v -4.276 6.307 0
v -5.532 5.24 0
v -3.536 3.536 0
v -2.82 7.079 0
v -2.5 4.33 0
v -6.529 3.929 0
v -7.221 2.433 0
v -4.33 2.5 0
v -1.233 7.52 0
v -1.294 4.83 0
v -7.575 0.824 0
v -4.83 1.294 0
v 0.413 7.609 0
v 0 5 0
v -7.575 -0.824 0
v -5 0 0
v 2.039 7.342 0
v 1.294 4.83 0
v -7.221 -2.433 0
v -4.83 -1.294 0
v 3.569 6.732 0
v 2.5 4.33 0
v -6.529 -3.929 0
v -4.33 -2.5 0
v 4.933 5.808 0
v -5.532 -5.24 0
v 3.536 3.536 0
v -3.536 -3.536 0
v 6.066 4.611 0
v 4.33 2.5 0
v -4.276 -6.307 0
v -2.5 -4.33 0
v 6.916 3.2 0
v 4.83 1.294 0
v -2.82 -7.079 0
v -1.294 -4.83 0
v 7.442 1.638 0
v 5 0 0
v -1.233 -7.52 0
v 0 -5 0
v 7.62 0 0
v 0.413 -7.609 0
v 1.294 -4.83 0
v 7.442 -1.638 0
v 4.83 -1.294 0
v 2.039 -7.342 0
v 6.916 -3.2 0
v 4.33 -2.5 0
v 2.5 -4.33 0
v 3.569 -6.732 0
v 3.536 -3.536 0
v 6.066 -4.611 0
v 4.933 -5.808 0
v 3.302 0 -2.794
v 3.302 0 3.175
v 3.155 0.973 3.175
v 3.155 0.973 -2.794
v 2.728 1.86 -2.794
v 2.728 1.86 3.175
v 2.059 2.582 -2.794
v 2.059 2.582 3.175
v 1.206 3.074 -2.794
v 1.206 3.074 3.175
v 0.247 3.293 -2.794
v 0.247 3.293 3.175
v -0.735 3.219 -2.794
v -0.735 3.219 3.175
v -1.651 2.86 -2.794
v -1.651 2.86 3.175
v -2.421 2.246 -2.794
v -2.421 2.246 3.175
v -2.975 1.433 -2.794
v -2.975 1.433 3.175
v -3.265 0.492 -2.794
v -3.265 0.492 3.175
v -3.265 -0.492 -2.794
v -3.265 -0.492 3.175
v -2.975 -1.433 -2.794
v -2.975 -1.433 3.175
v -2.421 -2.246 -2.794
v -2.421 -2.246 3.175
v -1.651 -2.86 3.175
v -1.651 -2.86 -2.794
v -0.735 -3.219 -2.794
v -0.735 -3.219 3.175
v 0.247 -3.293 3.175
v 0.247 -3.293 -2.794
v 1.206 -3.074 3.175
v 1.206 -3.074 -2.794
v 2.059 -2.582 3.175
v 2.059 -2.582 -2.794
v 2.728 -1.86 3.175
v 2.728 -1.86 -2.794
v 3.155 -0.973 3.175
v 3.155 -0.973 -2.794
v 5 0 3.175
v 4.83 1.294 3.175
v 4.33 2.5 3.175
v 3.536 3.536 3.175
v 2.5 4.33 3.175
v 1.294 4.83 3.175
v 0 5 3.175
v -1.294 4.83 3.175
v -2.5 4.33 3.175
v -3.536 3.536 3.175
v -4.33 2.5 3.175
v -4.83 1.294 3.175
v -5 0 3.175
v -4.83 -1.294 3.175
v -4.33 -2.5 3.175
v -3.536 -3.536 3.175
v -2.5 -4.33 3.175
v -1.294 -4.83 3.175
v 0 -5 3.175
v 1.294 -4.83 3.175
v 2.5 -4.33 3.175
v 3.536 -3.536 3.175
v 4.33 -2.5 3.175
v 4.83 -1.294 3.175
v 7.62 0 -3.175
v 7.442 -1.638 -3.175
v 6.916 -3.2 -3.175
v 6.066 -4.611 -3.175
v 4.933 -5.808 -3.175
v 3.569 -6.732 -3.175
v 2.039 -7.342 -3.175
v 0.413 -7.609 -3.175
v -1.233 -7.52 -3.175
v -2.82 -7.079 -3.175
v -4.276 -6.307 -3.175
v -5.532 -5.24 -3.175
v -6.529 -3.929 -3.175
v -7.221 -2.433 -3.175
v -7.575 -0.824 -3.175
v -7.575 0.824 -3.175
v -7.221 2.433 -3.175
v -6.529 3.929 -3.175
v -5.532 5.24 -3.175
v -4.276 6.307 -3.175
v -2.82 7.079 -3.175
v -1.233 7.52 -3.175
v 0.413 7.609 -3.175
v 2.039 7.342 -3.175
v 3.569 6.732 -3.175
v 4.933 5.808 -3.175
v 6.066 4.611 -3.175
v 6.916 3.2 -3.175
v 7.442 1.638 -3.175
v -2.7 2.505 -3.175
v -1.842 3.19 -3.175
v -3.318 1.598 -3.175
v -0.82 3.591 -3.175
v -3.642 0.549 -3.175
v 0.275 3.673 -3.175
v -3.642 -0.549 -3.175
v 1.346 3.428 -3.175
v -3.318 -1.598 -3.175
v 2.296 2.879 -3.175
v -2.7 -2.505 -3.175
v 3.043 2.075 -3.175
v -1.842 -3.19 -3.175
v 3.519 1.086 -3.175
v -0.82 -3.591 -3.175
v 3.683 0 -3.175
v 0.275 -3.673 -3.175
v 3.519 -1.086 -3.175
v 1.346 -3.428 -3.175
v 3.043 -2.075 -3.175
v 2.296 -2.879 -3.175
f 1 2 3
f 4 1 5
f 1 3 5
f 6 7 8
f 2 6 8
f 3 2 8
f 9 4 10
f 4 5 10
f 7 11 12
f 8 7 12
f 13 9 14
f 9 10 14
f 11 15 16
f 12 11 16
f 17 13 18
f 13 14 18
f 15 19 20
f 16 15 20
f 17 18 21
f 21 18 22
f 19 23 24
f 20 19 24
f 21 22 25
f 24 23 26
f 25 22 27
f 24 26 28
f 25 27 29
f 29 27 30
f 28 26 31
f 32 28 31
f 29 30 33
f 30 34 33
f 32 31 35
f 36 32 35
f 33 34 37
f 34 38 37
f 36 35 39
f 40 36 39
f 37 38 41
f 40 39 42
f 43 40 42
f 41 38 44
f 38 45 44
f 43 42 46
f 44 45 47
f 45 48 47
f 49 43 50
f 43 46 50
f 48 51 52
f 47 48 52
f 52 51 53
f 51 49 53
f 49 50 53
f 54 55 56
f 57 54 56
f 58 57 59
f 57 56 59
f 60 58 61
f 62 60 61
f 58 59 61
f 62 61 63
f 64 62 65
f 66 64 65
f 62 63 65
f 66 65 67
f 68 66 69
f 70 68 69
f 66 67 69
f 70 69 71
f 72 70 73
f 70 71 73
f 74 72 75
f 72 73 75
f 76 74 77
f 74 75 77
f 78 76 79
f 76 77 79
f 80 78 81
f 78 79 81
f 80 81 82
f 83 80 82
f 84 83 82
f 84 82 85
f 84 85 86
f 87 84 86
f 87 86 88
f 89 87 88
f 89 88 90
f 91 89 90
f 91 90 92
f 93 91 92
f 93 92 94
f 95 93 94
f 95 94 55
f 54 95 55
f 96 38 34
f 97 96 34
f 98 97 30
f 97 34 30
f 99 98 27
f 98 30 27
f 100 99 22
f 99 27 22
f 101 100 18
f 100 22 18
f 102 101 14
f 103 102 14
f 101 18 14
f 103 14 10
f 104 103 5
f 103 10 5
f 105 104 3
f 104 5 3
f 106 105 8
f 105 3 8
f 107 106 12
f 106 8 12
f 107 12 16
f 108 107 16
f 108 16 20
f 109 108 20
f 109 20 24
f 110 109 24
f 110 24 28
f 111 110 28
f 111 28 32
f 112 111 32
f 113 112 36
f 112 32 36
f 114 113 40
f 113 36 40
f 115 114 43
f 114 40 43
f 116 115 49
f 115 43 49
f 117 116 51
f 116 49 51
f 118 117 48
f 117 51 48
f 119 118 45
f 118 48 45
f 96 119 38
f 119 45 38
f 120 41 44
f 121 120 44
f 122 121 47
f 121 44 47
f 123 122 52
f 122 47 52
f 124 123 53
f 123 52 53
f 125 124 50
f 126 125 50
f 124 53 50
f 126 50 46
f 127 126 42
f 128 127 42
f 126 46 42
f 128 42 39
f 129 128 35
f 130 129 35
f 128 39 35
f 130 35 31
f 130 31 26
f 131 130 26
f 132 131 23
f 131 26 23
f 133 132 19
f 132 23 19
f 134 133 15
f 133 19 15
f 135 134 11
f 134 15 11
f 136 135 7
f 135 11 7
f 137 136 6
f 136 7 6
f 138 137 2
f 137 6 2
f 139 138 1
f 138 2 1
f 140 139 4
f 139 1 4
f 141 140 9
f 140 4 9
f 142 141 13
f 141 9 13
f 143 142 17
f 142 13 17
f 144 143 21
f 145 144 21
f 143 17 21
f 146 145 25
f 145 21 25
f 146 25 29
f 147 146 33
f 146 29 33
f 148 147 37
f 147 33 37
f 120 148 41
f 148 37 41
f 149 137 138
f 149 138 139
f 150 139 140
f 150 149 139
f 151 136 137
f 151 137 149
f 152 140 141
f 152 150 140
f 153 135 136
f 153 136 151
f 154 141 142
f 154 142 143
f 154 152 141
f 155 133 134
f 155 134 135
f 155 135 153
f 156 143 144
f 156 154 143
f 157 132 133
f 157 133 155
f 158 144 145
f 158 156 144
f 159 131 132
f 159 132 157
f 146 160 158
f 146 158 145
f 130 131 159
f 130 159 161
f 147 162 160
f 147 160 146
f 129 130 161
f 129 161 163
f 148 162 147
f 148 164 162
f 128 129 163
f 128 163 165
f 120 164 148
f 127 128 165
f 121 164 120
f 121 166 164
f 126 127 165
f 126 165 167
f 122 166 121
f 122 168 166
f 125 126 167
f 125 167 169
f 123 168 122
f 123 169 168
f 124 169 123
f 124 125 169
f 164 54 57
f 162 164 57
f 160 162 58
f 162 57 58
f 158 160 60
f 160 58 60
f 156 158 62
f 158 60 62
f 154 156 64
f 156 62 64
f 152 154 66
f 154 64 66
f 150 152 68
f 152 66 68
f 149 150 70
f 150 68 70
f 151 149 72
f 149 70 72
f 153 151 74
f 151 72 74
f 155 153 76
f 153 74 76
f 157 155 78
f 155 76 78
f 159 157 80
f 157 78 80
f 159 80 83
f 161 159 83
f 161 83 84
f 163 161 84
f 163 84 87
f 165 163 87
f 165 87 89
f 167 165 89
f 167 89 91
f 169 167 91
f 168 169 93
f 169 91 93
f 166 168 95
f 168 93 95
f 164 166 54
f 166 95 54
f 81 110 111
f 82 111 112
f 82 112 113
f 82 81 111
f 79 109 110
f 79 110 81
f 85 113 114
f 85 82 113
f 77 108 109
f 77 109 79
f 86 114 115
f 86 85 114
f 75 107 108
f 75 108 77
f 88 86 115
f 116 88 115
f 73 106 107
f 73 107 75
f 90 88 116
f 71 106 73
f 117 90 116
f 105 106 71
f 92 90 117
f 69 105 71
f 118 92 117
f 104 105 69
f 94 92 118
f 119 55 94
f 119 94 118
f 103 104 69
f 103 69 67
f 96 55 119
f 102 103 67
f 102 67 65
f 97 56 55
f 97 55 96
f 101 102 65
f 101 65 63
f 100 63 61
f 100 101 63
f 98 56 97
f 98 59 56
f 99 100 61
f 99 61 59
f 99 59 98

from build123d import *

# Parameters (mm, degrees)
F0_R     = 5
F1_DEPTH = 3.175
F2_R     = 7.62
F2_R_2   = 5
F3_DEPTH = 3.175
F4_R     = 3.302
F5_DEPTH = 6.351
F6_SIZE  = 0.381


with BuildPart() as f1:
    # F0 (on Top) → F1 (new body)
    with BuildSketch(Plane.XY):
        Circle(F0_R)
    extrude(amount=F1_DEPTH)

    # F2 (on face) → F3 (join)
    with BuildSketch(Plane(origin=(0, 0, 0), x_dir=(1, 0, 0), z_dir=(0, 0, -1))):
        Circle(F2_R)
        Circle(F2_R_2, mode=Mode.SUBTRACT)
        Circle(F2_R_2)
    extrude(amount=F3_DEPTH)

    # F4 (on face) → F5 (cut, through all)
    with BuildSketch(Plane.XY.offset(3.175)):
        Circle(F4_R)
    extrude(amount=-F5_DEPTH, mode=Mode.SUBTRACT)

    # F6
    f6_edges = [f1.edges().sort_by_distance(p)[0] for p in [
        (-3.302, 0, -3.175),
    ]]
    chamfer(f6_edges, length=F6_SIZE)


solid = f1.part
